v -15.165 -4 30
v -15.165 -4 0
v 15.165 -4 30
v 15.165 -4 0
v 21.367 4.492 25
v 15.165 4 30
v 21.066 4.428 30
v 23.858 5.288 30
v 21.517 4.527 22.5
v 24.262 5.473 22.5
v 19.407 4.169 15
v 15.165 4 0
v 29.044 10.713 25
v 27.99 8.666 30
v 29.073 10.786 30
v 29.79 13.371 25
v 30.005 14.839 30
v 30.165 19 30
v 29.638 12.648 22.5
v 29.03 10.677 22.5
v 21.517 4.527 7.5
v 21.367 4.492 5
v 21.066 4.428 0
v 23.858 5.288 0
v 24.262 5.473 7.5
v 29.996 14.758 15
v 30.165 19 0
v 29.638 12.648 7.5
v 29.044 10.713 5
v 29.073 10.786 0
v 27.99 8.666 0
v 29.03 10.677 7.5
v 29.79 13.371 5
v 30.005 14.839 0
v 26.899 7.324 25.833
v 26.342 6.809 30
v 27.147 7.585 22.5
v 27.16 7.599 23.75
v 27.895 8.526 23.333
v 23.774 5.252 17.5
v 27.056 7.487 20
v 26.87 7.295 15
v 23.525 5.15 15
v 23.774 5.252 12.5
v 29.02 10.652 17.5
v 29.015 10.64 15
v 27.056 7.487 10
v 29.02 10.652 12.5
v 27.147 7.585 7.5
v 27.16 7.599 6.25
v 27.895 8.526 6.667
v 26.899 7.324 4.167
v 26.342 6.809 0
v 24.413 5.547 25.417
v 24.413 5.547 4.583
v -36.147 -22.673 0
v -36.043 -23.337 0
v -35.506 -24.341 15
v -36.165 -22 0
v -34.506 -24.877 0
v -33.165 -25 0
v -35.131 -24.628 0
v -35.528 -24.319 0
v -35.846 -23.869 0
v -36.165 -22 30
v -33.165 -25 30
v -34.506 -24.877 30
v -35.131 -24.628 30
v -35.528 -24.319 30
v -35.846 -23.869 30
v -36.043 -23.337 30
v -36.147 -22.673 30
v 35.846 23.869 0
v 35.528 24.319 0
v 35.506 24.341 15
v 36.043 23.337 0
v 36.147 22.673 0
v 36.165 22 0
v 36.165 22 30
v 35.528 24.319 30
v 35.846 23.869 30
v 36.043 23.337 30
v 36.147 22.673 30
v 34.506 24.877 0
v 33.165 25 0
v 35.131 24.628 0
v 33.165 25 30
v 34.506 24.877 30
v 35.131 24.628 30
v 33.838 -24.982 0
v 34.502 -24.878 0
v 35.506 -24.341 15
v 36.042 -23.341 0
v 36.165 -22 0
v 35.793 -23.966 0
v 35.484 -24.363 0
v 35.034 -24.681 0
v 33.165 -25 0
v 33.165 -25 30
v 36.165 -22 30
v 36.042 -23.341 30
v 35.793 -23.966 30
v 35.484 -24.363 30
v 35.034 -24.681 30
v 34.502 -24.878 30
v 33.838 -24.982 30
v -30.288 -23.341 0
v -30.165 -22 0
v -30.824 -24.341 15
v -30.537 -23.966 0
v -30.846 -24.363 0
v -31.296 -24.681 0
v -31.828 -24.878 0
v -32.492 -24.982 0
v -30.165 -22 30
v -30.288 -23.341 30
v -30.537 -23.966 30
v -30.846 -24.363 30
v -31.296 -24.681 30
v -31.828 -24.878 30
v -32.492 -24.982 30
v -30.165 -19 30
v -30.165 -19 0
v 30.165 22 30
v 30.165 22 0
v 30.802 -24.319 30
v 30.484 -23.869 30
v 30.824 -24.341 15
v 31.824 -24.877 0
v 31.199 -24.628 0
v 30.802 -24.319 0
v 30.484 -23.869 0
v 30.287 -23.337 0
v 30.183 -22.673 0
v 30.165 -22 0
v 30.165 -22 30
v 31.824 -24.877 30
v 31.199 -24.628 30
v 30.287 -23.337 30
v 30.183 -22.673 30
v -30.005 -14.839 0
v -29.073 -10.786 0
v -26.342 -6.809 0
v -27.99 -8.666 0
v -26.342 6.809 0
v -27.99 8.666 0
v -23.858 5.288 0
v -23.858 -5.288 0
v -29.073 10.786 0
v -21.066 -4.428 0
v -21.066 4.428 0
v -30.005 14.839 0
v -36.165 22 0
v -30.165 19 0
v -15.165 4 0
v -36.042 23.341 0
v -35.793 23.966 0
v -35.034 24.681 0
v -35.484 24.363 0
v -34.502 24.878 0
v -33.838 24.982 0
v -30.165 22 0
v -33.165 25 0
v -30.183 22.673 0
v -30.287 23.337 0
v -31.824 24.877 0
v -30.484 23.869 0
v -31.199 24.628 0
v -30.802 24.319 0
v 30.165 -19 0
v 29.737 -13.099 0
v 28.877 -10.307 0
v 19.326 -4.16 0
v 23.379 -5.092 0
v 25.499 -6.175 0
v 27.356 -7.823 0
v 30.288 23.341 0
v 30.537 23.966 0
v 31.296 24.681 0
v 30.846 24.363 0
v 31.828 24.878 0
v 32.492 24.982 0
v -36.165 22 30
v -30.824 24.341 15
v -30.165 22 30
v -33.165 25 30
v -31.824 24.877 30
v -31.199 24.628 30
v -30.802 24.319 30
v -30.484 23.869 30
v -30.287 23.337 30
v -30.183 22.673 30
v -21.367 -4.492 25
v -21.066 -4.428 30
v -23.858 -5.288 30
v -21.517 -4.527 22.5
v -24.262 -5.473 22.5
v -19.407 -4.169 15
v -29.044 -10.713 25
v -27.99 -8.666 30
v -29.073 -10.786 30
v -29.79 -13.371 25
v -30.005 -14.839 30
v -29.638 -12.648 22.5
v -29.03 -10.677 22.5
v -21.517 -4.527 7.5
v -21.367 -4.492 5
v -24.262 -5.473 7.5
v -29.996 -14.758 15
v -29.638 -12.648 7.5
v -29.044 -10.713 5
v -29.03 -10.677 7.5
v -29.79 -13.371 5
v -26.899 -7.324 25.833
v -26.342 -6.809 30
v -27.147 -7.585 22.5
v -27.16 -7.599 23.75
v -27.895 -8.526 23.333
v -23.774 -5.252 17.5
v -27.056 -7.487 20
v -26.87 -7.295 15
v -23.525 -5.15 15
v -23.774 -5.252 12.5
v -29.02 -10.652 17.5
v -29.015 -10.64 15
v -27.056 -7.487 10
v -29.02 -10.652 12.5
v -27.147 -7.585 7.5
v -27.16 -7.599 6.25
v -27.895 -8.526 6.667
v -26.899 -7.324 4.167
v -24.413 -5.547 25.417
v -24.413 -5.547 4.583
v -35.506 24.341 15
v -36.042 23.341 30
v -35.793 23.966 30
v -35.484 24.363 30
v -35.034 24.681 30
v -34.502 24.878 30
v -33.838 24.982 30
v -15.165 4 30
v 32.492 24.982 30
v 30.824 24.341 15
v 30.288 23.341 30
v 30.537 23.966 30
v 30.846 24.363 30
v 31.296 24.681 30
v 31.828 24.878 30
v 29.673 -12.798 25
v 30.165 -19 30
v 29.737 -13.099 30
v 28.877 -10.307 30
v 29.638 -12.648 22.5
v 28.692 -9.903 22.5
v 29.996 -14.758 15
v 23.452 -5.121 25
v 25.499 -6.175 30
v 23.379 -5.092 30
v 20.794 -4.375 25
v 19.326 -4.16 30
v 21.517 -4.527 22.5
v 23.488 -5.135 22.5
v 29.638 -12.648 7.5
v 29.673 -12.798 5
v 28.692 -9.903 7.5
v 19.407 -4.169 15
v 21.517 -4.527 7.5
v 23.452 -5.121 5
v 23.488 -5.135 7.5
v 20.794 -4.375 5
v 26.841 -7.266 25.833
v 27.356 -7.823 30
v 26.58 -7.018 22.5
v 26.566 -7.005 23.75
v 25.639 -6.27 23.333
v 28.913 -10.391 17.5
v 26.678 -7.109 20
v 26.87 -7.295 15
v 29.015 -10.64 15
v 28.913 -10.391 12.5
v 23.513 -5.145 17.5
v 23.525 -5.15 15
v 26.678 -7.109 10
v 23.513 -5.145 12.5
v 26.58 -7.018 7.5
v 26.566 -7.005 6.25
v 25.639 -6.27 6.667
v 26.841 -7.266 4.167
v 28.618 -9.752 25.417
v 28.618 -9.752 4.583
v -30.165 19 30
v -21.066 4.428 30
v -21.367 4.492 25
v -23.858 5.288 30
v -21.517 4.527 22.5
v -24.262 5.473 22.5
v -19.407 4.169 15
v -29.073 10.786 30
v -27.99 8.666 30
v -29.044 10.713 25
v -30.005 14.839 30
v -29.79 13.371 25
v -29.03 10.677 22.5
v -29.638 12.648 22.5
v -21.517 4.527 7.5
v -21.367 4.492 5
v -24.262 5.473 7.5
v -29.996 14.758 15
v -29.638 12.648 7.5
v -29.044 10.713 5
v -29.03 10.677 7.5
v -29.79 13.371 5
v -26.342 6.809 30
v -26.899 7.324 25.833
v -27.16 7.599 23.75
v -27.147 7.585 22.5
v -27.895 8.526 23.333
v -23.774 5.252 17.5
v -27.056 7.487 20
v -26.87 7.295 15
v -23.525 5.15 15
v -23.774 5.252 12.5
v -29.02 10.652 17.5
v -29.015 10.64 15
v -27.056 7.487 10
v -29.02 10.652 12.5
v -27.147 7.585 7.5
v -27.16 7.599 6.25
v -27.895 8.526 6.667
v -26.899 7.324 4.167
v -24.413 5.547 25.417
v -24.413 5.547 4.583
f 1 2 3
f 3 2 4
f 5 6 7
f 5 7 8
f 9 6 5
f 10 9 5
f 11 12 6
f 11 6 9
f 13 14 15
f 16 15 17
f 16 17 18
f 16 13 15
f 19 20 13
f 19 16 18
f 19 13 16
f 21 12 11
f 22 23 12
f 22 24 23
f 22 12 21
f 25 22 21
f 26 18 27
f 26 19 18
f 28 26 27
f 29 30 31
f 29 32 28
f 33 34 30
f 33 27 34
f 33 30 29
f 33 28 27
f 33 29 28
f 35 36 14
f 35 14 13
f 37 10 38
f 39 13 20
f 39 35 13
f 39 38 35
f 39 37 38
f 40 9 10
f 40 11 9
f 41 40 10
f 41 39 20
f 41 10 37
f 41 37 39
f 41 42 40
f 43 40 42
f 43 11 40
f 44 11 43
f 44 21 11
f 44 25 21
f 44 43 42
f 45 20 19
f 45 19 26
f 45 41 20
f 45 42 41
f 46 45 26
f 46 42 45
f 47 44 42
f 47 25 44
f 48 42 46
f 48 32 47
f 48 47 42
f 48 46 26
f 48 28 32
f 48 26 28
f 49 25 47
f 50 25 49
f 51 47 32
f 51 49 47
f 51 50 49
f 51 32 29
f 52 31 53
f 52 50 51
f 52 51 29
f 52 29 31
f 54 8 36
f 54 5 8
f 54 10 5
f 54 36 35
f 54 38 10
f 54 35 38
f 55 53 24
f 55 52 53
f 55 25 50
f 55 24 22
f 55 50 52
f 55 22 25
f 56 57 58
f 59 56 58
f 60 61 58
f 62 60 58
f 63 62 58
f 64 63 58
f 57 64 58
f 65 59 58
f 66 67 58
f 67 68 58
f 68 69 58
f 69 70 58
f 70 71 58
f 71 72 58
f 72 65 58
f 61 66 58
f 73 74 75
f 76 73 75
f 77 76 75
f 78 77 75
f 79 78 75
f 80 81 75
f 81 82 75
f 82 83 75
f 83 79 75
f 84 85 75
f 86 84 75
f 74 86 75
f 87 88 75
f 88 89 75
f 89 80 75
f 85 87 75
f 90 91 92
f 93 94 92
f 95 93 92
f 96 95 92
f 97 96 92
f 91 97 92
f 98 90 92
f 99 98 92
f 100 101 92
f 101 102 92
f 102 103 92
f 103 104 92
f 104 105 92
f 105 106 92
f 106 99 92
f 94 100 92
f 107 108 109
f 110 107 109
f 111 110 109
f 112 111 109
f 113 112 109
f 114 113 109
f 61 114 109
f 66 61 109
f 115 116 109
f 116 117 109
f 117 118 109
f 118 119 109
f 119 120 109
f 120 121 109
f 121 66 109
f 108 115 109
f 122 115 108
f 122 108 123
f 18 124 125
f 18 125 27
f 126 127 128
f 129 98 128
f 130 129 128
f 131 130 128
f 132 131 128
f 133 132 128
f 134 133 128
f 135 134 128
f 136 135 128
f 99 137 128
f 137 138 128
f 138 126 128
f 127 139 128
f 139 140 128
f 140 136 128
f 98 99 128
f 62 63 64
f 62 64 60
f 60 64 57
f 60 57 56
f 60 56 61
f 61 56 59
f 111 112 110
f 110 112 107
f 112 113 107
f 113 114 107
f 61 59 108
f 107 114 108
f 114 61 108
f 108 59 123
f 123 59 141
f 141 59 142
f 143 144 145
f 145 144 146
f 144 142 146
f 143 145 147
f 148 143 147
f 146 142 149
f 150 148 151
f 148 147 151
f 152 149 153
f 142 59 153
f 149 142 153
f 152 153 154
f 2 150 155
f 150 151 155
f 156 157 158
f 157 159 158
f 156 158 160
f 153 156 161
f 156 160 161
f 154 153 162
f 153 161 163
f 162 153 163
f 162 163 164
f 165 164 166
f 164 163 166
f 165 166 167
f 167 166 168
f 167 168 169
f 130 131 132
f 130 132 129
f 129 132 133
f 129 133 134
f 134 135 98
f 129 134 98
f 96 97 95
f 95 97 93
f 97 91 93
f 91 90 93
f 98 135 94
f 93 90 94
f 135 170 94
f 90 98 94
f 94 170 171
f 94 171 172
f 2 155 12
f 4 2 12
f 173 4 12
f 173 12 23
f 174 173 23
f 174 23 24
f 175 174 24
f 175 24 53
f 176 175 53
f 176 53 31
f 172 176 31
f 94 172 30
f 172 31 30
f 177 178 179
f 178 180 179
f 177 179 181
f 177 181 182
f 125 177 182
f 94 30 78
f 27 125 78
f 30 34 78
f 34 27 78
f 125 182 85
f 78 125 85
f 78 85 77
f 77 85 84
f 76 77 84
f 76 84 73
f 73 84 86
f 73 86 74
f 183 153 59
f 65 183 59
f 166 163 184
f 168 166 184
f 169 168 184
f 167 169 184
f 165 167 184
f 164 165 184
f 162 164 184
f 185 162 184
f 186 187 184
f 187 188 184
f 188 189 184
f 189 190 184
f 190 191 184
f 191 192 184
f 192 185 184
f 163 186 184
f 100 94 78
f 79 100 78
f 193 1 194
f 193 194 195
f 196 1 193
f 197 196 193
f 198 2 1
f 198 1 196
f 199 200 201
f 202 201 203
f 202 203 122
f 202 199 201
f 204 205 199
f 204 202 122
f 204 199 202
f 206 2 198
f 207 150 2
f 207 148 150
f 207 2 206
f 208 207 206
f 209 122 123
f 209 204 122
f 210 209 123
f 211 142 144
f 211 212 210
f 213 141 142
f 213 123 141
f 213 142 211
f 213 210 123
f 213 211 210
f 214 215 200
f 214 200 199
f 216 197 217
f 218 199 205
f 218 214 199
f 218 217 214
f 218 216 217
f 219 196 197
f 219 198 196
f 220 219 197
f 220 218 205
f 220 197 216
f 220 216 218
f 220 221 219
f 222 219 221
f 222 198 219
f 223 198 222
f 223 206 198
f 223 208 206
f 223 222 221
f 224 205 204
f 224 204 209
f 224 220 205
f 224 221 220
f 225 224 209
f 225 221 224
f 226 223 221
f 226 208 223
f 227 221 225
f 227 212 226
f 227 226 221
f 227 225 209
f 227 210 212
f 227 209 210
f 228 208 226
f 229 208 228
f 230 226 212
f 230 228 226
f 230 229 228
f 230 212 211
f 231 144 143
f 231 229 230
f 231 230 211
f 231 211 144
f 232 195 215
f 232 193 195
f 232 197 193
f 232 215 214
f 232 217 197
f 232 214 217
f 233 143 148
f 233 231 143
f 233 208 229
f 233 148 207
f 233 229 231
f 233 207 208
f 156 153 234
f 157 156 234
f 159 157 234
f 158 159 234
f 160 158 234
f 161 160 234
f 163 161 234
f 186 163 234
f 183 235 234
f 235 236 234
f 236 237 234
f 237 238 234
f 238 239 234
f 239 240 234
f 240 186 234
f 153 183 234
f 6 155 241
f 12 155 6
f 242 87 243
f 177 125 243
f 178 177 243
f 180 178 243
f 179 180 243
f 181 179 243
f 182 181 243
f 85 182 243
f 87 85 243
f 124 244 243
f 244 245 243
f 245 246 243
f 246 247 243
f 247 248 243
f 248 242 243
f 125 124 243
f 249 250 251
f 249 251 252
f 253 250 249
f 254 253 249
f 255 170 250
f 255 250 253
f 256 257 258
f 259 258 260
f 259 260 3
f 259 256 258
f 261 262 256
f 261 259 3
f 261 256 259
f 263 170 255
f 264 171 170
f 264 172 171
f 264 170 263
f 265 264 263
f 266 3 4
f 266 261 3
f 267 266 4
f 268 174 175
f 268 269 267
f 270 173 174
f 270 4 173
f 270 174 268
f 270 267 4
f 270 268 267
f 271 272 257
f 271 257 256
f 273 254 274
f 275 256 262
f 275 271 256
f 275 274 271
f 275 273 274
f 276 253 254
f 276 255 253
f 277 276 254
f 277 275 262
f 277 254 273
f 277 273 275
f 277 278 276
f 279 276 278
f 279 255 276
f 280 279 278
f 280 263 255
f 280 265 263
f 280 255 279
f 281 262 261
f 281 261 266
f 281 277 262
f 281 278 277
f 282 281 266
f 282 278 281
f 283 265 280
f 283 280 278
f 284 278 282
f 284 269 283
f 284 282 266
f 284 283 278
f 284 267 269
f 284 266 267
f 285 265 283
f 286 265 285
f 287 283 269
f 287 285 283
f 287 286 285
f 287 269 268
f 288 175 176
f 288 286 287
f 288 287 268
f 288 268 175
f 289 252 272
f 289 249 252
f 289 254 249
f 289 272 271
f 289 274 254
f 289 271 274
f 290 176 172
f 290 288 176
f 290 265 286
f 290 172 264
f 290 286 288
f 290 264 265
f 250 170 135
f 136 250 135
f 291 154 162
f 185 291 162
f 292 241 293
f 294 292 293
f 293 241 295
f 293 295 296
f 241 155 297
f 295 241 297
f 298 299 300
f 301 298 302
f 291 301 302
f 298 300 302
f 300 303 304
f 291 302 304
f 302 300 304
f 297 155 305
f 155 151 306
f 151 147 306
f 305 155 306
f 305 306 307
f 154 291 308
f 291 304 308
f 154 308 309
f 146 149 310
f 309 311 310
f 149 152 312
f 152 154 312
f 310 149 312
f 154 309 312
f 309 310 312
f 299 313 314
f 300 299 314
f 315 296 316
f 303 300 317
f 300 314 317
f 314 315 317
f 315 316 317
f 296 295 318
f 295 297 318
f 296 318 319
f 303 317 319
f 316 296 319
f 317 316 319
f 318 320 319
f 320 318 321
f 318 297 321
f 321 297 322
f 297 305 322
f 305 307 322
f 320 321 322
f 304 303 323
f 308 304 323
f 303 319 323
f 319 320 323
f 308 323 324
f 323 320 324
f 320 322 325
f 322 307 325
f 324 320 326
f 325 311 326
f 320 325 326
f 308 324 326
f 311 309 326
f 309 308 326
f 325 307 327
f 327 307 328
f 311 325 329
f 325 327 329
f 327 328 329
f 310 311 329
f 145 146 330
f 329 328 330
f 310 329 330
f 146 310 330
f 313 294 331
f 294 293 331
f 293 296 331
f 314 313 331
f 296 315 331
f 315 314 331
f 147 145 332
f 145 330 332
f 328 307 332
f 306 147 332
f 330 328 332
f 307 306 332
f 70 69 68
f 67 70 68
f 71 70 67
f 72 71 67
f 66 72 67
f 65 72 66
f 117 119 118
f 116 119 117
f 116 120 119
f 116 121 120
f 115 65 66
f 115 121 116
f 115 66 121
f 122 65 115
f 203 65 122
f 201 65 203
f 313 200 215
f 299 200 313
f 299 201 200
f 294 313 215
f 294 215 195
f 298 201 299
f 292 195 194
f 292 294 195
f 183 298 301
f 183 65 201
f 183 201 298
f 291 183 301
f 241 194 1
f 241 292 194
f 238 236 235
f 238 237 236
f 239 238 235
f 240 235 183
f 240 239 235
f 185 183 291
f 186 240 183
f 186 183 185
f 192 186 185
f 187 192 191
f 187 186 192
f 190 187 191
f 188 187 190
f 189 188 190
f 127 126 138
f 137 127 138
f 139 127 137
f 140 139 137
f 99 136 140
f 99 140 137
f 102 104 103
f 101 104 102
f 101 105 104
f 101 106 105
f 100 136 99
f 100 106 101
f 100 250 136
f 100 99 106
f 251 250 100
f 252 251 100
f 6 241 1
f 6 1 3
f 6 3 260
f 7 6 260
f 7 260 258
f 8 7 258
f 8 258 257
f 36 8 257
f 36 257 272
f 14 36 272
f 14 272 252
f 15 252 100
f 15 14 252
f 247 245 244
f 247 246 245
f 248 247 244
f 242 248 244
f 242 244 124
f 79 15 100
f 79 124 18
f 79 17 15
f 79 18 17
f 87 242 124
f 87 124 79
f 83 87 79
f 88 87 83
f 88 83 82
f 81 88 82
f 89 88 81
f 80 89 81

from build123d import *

# Parameters (mm, degrees)
SKETCH1_W           = 60.33
SKETCH1_H           = 4
BOSS_EXTRUDE1_DEPTH = 30
FILLET1_SIZE        = 15
FILLET2_SIZE        = 3


with BuildPart() as part:
    # Sketch1 → Boss-Extrude1 (new body)
    with BuildSketch(Plane.XY):
        Polygon((-36.165, 0), (-30.165, 0), (-30.165, 4), (-30.165, 25), (-36.165, 25), align=None)
        Polygon((-30.165, -4), (-30.165, 0), (-36.165, 0), (-36.165, -25), (-30.165, -25), align=None)
        with Locations((0, -2)):
            Rectangle(SKETCH1_W, SKETCH1_H)
        with Locations((0, 2)):
            Rectangle(SKETCH1_W, SKETCH1_H)
        Polygon((30.165, 0), (36.165, 0), (36.165, 25), (30.165, 25), (30.165, 4), align=None)
        Polygon((36.165, -25), (36.165, 0), (30.165, 0), (30.165, -4), (30.165, -25), align=None)
    extrude(amount=BOSS_EXTRUDE1_DEPTH)

    # Fillet1
    # a fillet whose section is not a circle: 15 mm, written as the material it adds along each edge
    with BuildSketch(Plane(origin=(30.165, -4, 0), x_dir=(0, -1, 0), z_dir=(0, 0, 1)), Plane(origin=(30.165, 4, 0), x_dir=(-1, 0, 0), z_dir=(0, 0, 1)), Plane(origin=(-30.165, -4, 0), x_dir=(1, 0, 0), z_dir=(0, 0, 1))) as fillet1_piece_1:
        with BuildLine():
            add(Edge.make_bspline([(FILLET1_SIZE, 0), (FILLET1_SIZE * 0.831801948466, 0), (FILLET1_SIZE * 0.663603896932, 0), (FILLET1_SIZE * 0.292893218813, -FILLET1_SIZE * 0.0716919198361), (FILLET1_SIZE * 0.0716919198361, -FILLET1_SIZE * 0.292893218813), (0, -FILLET1_SIZE * 0.663603896932), (0, -FILLET1_SIZE * 0.831801948466), (0, -FILLET1_SIZE)], knots=[0, 0, 0, 0, 0, 0, 0.5, 0.5, 1, 1, 1, 1, 1, 1], degree=5))
            Line((0, -FILLET1_SIZE), (-FILLET1_SIZE * 0.02, -FILLET1_SIZE))
            Line((-FILLET1_SIZE * 0.02, -FILLET1_SIZE), (-FILLET1_SIZE * 0.02, FILLET1_SIZE * 0.02))
            Line((-FILLET1_SIZE * 0.02, FILLET1_SIZE * 0.02), (FILLET1_SIZE, FILLET1_SIZE * 0.02))
            Line((FILLET1_SIZE, FILLET1_SIZE * 0.02), (FILLET1_SIZE, 0))
        make_face()
    extrude(amount=30)
    with BuildSketch(Plane(origin=(-30.165, 4, 0), x_dir=(1, 0, 0), z_dir=(0, 0, 1))) as fillet1_piece_2:
        with BuildLine():
            add(Edge.make_bspline([(FILLET1_SIZE, 0), (FILLET1_SIZE * 0.831801948466, 0), (FILLET1_SIZE * 0.663603896932, 0), (FILLET1_SIZE * 0.292893218813, FILLET1_SIZE * 0.0716919198361), (FILLET1_SIZE * 0.0716919198361, FILLET1_SIZE * 0.292893218813), (0, FILLET1_SIZE * 0.663603896932), (0, FILLET1_SIZE * 0.831801948466), (0, FILLET1_SIZE)], knots=[0, 0, 0, 0, 0, 0, 0.5, 0.5, 1, 1, 1, 1, 1, 1], degree=5))
            Line((0, FILLET1_SIZE), (-FILLET1_SIZE * 0.02, FILLET1_SIZE))
            Line((-FILLET1_SIZE * 0.02, FILLET1_SIZE), (-FILLET1_SIZE * 0.02, -FILLET1_SIZE * 0.02))
            Line((-FILLET1_SIZE * 0.02, -FILLET1_SIZE * 0.02), (FILLET1_SIZE, -FILLET1_SIZE * 0.02))
            Line((FILLET1_SIZE, -FILLET1_SIZE * 0.02), (FILLET1_SIZE, 0))
        make_face()
    extrude(amount=30)

    # Fillet2
    # a fillet whose section is not a circle: 3 mm, written as the material it takes off along each edge
    with BuildSketch(Plane(origin=(30.165, 25, -7.5), x_dir=(1, 0, 0), z_dir=(0, 0, 1)), Plane(origin=(36.165, 25, -7.5), x_dir=(0, -1, 0), z_dir=(0, 0, 1)), Plane(origin=(36.165, -25, -7.5), x_dir=(-1, 0, 0), z_dir=(0, 0, 1)), Plane(origin=(30.165, -25, -7.5), x_dir=(0, 1, 0), z_dir=(0, 0, 1)), Plane(origin=(-30.165, -25, -7.5), x_dir=(-1, 0, 0), z_dir=(0, 0, 1)), Plane(origin=(-36.165, -25, -7.5), x_dir=(0, 1, 0), z_dir=(0, 0, 1)), Plane(origin=(-36.165, 25, -7.5), x_dir=(1, 0, 0), z_dir=(0, 0, 1)), Plane(origin=(-30.165, 25, -7.5), x_dir=(0, -1, 0), z_dir=(0, 0, 1))) as fillet2_piece_1:
        with BuildLine():
            add(Edge.make_bspline([(FILLET2_SIZE, 0), (FILLET2_SIZE * 0.831801948466, 0), (FILLET2_SIZE * 0.663603896932, 0), (FILLET2_SIZE * 0.292893218813, -FILLET2_SIZE * 0.0716919198361), (FILLET2_SIZE * 0.0716919198361, -FILLET2_SIZE * 0.292893218813), (0, -FILLET2_SIZE * 0.663603896932), (0, -FILLET2_SIZE * 0.831801948466), (0, -FILLET2_SIZE)], knots=[0, 0, 0, 0, 0, 0, 0.5, 0.5, 1, 1, 1, 1, 1, 1], degree=5))
            Line((0, -FILLET2_SIZE), (0, 0))
            Line((0, 0), (FILLET2_SIZE, 0))
        make_face()
    extrude(amount=45, mode=Mode.SUBTRACT)


solid = part.part
